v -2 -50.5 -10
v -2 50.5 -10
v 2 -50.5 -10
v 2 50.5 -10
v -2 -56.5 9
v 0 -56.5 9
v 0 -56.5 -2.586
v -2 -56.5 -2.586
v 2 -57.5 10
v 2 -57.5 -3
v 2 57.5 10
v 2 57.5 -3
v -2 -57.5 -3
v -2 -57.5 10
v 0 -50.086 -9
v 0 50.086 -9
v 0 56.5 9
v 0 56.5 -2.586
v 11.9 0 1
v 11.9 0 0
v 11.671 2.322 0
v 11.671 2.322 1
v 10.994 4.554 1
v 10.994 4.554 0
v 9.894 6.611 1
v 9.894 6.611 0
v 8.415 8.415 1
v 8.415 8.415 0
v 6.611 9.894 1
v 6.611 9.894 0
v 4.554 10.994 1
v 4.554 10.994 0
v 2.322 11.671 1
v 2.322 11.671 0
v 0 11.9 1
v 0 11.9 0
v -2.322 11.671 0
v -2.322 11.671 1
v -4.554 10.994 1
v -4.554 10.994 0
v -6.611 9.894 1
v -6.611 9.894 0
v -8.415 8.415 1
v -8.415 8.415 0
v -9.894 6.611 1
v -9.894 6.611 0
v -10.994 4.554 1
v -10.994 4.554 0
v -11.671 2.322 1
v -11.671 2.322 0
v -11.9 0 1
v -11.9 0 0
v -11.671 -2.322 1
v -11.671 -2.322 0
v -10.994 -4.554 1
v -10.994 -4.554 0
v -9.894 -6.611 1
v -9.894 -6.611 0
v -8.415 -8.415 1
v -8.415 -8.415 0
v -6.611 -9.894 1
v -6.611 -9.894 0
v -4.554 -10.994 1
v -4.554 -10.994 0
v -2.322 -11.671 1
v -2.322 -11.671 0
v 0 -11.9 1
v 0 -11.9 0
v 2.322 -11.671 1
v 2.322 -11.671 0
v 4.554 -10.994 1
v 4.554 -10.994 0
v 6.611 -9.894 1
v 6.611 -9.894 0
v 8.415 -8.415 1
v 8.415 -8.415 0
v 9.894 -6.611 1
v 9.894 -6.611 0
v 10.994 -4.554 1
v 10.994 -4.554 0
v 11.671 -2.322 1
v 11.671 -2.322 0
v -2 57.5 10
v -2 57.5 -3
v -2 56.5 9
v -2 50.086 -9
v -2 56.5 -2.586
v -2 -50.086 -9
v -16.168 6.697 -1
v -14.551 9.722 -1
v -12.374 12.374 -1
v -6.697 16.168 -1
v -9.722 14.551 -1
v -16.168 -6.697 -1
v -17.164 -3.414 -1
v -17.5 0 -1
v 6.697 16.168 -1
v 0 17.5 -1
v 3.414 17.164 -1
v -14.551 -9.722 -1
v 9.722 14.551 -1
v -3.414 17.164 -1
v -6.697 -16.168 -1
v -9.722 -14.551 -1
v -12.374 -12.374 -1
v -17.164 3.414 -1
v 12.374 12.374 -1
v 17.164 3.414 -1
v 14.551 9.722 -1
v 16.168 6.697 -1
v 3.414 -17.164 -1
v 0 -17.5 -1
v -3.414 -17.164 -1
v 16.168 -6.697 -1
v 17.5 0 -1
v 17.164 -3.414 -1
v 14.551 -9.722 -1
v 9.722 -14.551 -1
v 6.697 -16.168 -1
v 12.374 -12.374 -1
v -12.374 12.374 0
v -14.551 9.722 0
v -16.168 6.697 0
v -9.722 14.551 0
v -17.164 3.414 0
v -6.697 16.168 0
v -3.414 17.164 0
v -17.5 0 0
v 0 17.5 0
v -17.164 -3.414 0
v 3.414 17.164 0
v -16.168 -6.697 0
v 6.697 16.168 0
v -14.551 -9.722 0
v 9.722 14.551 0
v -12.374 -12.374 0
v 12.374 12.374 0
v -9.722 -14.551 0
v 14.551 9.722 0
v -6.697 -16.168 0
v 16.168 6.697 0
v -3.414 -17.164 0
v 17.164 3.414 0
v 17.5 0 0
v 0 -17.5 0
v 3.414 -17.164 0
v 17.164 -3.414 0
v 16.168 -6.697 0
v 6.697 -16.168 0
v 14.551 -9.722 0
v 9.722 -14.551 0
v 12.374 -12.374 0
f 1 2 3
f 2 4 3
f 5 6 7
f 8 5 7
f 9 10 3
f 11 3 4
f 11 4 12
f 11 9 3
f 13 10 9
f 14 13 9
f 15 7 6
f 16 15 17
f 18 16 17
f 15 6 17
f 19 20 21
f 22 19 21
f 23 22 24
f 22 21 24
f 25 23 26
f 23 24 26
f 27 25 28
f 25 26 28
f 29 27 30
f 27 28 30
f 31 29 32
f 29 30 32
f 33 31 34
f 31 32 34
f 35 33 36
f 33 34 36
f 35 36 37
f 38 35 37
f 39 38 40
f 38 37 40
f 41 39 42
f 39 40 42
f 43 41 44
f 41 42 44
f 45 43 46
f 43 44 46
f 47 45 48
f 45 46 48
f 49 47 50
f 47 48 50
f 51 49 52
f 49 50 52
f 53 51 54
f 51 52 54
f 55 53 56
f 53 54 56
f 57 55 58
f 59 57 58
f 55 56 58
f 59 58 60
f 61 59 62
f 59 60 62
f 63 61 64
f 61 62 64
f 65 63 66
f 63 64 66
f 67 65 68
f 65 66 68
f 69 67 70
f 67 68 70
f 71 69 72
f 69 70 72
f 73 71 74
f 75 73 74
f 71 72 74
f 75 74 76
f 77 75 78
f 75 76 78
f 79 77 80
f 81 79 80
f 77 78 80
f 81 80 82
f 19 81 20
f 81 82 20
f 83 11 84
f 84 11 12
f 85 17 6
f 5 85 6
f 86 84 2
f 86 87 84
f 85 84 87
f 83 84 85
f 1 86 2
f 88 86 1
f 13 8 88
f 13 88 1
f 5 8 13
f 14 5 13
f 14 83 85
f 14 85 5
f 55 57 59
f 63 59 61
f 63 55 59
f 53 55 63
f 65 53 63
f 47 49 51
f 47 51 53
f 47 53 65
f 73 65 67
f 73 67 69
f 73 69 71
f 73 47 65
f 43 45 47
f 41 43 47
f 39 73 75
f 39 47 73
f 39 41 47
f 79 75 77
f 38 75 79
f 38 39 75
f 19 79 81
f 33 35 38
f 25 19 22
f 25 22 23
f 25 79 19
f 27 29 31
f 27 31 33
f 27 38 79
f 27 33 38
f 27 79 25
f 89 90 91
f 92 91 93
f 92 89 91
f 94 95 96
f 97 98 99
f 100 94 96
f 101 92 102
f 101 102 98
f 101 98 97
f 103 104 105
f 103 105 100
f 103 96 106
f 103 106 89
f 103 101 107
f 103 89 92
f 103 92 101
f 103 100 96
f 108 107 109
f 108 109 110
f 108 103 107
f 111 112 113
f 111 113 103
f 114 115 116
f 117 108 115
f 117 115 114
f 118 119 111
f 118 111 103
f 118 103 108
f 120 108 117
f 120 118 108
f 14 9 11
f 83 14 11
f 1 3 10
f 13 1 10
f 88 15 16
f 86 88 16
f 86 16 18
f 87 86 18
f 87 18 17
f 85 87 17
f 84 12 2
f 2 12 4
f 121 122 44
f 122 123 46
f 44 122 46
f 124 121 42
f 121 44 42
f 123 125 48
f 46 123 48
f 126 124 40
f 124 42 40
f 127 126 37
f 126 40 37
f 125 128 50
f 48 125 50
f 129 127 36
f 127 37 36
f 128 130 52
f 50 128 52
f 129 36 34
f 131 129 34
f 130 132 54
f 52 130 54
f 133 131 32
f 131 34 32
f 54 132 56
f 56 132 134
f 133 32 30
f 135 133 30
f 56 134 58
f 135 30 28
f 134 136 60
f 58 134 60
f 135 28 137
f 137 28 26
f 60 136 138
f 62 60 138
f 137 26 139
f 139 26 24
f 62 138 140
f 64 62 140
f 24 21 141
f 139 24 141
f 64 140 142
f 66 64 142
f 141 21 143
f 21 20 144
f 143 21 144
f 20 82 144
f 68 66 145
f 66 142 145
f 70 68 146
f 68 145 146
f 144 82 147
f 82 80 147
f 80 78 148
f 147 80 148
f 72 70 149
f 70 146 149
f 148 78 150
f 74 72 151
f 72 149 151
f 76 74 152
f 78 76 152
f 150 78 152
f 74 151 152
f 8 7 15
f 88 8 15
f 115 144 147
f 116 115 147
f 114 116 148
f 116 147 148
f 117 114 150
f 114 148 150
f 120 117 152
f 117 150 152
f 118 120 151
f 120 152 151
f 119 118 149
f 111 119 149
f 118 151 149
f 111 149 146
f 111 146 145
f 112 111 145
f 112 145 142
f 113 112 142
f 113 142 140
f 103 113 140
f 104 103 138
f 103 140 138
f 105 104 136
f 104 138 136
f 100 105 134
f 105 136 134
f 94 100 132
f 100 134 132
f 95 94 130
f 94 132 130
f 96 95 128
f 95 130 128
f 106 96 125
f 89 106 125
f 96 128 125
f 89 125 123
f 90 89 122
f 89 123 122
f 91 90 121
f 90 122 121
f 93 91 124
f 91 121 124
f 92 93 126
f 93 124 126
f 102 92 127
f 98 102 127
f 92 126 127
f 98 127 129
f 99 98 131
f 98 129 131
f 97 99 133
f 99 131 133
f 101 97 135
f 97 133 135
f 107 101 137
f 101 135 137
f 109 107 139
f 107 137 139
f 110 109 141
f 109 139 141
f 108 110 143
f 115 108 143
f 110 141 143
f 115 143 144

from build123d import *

# Parameters (mm, degrees)
F0_R     = 11.9
F1_DEPTH = 1
F2_R     = 17.5
F3_DEPTH = 1
F4_W     = 115
F4_H     = 20
F5_DEPTH = 2
F6_SIZE  = 7
F8_DEPTH = 2


with BuildPart() as f1:
    # F0 (on Top) → F1 (new body)
    with BuildSketch(Plane.XY):
        Circle(F0_R)
    extrude(amount=F1_DEPTH)

    # F2 (on face) → F3 (join)
    with BuildSketch(Plane(origin=(0, 0, 0), x_dir=(1, 0, 0), z_dir=(0, 0, -1))):
        Circle(F2_R)
    extrude(amount=F3_DEPTH)


with BuildPart() as f5:
    # F4 (on Right) → F5 (new body)
    with BuildSketch(Plane.YZ):
        Rectangle(F4_W, F4_H)
    extrude(amount=F5_DEPTH)

    # F6
    f6_edges = [f5.edges().sort_by_distance(p)[0] for p in [
        (1, -57.5, -10),
        (1, 57.5, -10),
    ]]
    chamfer(f6_edges, length=F6_SIZE)

    # F7 (on face) → F8 (join)
    with BuildSketch(Plane(origin=(0, 0, 0), x_dir=(0, -1, 0), z_dir=(-1, 0, 0))):
        Polygon((57.5, 10), (-57.5, 10), (-57.5, -3), (-50.5, -10), (50.5, -10), (57.5, -3), align=None)
        Polygon((-56.5, -2.585786), (-56.5, 9), (56.5, 9), (56.5, -2.585786), (50.085786, -9), (-50.085786, -9), align=None, mode=Mode.SUBTRACT)
    extrude(amount=F8_DEPTH)


solid = Compound([f1.part, f5.part])
